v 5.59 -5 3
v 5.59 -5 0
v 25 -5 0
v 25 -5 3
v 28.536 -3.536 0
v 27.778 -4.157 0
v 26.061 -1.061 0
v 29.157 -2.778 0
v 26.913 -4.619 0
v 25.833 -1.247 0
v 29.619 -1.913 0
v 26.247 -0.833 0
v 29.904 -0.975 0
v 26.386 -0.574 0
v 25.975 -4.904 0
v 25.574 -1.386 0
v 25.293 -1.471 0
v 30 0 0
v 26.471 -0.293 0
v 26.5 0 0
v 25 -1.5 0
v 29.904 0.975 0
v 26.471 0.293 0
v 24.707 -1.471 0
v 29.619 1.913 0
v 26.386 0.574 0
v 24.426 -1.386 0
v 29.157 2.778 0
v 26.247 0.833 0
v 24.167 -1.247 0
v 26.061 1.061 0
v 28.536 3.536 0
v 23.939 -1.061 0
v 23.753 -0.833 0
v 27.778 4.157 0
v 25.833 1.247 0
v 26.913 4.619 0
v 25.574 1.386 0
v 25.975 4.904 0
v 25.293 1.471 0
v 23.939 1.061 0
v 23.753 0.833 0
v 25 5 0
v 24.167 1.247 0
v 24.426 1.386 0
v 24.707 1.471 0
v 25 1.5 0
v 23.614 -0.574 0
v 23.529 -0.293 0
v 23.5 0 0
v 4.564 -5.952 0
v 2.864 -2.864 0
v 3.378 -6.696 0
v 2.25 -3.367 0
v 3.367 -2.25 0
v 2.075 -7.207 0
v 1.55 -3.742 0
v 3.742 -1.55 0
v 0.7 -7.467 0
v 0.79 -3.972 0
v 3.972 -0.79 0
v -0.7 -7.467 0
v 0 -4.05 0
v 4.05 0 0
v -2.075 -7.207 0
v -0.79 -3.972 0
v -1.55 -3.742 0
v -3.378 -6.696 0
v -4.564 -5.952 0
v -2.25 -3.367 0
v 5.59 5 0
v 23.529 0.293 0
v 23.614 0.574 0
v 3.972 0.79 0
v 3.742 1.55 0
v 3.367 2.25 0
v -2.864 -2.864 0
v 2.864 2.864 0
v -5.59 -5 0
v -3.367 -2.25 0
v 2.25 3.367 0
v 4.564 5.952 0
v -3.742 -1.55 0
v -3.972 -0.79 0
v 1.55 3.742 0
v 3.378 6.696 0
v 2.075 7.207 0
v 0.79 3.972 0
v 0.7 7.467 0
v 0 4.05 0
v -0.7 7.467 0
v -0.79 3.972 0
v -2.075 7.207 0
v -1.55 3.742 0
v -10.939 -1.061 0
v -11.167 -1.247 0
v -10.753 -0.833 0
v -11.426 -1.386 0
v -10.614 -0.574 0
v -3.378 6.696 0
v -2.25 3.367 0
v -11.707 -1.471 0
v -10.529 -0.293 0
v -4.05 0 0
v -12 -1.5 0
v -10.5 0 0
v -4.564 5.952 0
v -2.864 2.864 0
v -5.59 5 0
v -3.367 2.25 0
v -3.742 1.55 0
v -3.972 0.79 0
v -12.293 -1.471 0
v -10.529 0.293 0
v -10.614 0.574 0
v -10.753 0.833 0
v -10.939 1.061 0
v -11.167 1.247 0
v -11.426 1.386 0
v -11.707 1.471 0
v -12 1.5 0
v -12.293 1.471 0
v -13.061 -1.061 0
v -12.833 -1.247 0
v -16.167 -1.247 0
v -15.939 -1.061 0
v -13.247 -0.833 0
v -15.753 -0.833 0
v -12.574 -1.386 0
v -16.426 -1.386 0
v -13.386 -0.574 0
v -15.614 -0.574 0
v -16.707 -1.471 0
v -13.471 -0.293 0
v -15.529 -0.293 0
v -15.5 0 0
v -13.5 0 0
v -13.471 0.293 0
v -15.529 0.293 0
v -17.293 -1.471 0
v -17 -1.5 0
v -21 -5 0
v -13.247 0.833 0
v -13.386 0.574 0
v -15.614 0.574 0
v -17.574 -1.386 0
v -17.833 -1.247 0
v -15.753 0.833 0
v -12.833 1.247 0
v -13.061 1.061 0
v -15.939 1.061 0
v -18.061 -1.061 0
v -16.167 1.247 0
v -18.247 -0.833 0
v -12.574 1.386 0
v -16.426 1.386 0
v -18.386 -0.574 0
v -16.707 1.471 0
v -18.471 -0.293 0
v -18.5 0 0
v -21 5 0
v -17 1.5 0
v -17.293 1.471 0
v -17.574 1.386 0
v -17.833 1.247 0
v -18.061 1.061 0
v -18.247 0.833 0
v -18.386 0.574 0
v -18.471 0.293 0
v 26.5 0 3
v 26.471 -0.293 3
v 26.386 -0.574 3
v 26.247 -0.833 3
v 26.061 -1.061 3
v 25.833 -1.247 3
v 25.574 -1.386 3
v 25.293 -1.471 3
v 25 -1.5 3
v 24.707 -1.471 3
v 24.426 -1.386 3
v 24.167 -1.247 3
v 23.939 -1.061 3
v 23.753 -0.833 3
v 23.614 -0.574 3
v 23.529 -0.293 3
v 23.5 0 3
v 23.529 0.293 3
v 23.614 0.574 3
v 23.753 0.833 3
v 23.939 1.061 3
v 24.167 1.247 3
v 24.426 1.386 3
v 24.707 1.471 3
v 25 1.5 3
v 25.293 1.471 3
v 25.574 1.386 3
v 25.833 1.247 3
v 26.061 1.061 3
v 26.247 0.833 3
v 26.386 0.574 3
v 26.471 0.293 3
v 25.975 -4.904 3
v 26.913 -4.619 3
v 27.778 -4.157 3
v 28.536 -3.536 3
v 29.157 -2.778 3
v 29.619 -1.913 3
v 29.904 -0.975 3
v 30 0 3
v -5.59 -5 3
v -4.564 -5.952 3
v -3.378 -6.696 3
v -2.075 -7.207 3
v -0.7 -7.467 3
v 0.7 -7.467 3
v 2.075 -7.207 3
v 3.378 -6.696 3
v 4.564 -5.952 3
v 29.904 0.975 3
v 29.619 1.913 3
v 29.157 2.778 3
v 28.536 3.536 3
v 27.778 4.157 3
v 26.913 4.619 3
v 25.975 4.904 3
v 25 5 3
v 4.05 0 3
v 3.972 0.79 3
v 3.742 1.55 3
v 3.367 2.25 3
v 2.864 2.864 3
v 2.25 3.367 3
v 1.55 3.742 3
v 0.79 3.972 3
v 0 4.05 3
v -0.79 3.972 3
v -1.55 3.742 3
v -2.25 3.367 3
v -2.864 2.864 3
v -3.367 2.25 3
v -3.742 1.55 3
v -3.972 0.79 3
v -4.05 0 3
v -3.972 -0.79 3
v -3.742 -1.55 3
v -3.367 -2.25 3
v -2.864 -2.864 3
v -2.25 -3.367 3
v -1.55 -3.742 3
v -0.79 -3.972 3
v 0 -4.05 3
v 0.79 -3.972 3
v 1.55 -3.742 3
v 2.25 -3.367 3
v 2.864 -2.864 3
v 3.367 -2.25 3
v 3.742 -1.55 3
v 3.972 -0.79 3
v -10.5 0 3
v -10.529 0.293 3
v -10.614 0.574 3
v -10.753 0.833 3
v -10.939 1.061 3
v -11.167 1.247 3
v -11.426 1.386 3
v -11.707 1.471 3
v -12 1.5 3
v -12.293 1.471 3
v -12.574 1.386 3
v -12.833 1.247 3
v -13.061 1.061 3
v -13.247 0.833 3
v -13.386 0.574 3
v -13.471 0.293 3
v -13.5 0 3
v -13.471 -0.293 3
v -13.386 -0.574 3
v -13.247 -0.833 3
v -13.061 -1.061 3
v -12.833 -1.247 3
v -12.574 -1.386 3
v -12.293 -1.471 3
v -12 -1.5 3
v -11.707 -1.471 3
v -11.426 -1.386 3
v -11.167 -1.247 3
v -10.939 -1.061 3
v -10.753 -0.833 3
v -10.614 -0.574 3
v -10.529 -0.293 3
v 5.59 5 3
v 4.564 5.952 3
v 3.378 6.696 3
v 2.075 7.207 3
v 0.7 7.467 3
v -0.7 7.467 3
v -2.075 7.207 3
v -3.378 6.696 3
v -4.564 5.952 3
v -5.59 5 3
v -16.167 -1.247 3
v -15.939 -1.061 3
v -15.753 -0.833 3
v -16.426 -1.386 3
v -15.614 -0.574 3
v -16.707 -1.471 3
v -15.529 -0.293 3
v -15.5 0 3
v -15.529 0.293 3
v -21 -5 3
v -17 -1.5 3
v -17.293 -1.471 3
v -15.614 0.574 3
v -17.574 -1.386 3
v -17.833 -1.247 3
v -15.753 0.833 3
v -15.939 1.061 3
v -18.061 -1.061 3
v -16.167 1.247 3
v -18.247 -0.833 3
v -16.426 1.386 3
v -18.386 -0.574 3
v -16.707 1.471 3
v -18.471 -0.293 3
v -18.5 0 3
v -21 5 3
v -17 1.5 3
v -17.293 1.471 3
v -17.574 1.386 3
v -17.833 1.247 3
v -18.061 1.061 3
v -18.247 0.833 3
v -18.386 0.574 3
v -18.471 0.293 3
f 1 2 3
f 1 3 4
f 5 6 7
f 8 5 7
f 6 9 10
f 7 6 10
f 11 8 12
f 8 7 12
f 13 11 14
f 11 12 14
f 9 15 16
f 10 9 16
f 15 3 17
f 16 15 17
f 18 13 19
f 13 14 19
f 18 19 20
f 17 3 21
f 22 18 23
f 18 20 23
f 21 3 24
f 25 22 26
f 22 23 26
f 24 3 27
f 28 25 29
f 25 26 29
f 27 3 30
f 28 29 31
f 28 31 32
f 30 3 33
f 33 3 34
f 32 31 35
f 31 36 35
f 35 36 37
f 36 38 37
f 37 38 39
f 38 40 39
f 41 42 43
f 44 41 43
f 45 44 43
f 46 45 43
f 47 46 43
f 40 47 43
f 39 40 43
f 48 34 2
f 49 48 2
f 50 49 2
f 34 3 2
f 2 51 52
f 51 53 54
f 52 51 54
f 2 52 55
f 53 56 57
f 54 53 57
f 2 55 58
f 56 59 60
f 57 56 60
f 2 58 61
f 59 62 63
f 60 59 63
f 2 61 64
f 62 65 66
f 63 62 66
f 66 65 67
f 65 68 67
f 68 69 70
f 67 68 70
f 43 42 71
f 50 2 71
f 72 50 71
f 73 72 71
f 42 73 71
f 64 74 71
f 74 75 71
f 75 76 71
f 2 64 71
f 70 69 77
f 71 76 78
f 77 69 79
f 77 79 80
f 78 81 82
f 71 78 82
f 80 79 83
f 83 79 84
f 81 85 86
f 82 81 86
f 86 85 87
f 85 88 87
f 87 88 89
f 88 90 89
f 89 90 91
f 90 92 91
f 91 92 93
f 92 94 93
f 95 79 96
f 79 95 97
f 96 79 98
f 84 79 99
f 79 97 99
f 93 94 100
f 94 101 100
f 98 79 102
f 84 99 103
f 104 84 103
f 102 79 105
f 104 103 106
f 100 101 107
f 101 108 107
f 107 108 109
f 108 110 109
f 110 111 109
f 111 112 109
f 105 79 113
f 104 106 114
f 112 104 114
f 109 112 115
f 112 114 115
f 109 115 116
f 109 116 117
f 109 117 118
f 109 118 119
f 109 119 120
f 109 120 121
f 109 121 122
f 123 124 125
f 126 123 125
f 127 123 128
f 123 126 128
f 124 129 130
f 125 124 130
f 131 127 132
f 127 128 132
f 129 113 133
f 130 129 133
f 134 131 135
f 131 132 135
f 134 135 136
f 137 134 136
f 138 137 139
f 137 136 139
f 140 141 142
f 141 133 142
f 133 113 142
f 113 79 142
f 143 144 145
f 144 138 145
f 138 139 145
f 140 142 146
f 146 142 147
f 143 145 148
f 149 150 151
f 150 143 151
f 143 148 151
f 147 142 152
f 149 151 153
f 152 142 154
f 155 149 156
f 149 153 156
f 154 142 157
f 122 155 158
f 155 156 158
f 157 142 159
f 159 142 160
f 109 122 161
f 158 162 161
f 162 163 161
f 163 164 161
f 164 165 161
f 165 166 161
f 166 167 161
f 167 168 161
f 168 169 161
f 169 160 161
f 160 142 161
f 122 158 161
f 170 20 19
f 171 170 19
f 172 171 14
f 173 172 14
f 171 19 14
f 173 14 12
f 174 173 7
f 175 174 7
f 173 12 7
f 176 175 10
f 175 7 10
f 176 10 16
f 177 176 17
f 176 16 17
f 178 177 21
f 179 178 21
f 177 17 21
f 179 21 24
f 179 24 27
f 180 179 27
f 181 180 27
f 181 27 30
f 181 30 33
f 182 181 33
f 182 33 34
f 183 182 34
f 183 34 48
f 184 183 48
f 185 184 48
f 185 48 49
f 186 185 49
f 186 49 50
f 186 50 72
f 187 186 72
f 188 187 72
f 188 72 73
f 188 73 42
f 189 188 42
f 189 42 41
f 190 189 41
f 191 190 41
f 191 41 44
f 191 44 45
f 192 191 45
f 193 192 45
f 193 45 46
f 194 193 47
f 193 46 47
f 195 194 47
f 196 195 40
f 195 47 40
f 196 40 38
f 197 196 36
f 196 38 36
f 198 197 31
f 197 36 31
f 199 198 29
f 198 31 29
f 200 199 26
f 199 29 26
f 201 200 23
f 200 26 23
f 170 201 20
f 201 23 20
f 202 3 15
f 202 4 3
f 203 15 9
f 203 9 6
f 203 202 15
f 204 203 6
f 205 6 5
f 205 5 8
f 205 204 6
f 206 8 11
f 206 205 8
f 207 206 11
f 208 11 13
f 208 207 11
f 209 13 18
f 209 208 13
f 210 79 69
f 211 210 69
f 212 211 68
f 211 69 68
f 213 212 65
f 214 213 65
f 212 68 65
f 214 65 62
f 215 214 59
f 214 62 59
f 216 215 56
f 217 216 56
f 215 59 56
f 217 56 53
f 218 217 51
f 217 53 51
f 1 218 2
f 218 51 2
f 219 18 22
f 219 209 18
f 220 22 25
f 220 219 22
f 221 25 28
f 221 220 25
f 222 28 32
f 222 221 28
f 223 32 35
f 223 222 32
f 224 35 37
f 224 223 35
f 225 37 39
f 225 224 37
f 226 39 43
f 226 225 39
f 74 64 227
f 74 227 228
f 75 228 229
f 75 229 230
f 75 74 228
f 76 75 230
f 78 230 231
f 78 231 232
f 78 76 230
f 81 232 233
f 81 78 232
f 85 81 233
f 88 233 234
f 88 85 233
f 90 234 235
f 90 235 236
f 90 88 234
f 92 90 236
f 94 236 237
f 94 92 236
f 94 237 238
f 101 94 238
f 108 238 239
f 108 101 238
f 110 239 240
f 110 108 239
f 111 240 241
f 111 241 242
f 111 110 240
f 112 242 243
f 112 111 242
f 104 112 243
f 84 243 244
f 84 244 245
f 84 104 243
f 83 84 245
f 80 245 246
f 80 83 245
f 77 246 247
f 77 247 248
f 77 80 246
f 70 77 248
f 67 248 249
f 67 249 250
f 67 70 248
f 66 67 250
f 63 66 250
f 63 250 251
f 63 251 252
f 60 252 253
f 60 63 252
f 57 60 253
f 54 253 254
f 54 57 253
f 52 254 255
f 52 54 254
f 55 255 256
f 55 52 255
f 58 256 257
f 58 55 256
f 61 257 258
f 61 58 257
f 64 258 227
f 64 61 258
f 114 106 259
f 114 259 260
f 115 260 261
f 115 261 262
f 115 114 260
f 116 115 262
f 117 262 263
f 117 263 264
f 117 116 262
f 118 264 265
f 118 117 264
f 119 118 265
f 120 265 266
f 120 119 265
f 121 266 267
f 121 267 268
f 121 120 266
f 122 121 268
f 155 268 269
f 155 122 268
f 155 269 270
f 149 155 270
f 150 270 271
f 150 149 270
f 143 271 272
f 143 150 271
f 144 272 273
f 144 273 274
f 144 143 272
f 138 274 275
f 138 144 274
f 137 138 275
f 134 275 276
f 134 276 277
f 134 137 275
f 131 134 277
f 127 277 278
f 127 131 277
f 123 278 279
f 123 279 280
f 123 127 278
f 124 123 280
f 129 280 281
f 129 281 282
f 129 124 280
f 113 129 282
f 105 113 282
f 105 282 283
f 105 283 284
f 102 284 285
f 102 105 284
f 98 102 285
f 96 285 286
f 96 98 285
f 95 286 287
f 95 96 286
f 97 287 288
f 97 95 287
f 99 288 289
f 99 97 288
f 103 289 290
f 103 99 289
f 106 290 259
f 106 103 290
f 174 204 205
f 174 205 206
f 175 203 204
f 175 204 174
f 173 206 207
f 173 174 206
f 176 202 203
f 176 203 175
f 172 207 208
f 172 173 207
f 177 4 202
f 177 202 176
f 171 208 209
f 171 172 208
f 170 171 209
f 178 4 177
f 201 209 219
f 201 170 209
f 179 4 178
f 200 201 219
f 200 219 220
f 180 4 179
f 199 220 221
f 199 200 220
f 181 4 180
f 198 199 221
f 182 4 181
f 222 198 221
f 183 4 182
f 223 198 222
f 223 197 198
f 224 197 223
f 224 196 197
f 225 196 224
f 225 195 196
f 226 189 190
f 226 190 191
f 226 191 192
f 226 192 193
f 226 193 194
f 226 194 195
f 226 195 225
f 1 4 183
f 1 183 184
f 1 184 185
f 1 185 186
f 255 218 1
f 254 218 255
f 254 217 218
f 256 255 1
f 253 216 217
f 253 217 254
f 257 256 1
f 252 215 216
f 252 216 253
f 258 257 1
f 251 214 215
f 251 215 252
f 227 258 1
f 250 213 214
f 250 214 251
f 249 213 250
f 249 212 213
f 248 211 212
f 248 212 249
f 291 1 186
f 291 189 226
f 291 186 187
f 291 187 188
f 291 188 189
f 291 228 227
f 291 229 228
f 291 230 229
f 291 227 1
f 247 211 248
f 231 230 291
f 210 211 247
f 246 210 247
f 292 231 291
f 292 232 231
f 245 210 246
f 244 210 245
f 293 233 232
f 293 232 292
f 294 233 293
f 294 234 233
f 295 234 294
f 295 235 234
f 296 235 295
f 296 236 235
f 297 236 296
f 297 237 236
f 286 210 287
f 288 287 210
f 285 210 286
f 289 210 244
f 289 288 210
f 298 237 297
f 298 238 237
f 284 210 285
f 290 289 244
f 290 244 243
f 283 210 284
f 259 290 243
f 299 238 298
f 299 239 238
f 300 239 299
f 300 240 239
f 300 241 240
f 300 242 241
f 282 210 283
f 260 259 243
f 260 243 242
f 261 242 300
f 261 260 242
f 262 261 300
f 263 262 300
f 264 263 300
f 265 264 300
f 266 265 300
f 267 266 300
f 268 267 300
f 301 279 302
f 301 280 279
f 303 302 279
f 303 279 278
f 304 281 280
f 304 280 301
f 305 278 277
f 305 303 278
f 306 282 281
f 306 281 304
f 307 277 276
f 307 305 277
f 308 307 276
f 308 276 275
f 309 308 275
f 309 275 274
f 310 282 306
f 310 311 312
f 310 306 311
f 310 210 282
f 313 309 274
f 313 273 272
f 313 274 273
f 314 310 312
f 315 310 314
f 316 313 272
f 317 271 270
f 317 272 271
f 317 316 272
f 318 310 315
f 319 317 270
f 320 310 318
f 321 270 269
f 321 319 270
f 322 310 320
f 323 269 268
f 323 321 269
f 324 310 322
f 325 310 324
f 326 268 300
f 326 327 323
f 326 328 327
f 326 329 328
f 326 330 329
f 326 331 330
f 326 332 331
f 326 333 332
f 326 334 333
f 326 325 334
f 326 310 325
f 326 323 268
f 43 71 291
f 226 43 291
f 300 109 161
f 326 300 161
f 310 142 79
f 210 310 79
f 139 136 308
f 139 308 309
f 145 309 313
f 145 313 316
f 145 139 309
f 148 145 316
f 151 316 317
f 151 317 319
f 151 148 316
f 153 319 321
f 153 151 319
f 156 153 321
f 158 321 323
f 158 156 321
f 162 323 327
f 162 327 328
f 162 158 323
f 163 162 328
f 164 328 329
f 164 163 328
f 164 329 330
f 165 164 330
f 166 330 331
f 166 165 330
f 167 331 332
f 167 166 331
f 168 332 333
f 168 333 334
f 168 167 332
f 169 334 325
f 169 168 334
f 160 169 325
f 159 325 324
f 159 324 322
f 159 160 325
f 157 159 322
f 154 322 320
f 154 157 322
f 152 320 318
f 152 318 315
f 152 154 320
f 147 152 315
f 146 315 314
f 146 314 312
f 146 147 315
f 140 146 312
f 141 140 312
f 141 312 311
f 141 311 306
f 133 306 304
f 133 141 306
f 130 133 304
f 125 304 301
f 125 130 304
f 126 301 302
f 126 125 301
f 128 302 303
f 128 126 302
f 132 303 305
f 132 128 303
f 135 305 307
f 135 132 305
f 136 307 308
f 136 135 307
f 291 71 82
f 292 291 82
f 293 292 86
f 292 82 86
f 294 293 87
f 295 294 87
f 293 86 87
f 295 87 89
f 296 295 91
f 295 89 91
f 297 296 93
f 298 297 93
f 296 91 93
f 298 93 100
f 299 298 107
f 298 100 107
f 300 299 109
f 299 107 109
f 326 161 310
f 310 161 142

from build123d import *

# Parameters (mm, degrees)
F0_R     = 1.5
F0_R_2   = 4.05
F1_DEPTH = 3
F2_W     = 10
F2_H     = 3
F3_DEPTH = 9
F4_R     = 1.5
F5_DEPTH = 25
F6_R     = 4.99999


# Not quite as in the source:
# - a fillet or chamfer is up to 0.001 mm smaller than in the source, because OpenCascade refuses the exact size


with BuildPart() as f1:
    # F0 (on Top) → F1 (new body)
    with BuildSketch(Plane.XY):
        Polygon((21, -5), (21, 5), (5.5901699437, 5), (-5.5901699437, 5), (-21, 5), (-21, -5), (-5.5901699437, -5), (5.5901699437, -5), align=None)
        with Locations((-17, 0)):
            Circle(F0_R, mode=Mode.SUBTRACT)
        with Locations((-12, 0)):
            Circle(F0_R, mode=Mode.SUBTRACT)
        Circle(F0_R_2, mode=Mode.SUBTRACT)
        with BuildLine():
            Line((-5.5901699437, 5), (5.5901699437, 5))
            ThreePointArc((5.5901699437, 5), (0, 7.5), (-5.5901699437, 5))
        make_face()
        with BuildLine():
            ThreePointArc((-5.5901699437, -5), (0, -7.5), (5.5901699437, -5))
            Line((5.5901699437, -5), (-5.5901699437, -5))
        make_face()
    extrude(amount=F1_DEPTH)

    # F2 (on face) → F3 (join)
    with BuildSketch(Plane.YZ.offset(21)):
        with Locations((0, 1.5)):
            Rectangle(F2_W, F2_H)
    extrude(amount=F3_DEPTH)

    # F4 (on face) → F5 (cut)
    with BuildSketch(Plane(origin=(0, 0, 0), x_dir=(1, 0, 0), z_dir=(0, 0, -1))):
        with Locations((25, 0)):
            Circle(F4_R)
    extrude(amount=-F5_DEPTH, mode=Mode.SUBTRACT)

    # F6 (radius 5 in the source; OpenCascade refuses exactly that, so slightly less here)
    f6_edges = [f1.edges().sort_by_distance(p)[0] for p in [
        (30, -5, 1.5),
        (30, 5, 1.5),
    ]]
    fillet(f6_edges, radius=F6_R)


solid = f1.part
